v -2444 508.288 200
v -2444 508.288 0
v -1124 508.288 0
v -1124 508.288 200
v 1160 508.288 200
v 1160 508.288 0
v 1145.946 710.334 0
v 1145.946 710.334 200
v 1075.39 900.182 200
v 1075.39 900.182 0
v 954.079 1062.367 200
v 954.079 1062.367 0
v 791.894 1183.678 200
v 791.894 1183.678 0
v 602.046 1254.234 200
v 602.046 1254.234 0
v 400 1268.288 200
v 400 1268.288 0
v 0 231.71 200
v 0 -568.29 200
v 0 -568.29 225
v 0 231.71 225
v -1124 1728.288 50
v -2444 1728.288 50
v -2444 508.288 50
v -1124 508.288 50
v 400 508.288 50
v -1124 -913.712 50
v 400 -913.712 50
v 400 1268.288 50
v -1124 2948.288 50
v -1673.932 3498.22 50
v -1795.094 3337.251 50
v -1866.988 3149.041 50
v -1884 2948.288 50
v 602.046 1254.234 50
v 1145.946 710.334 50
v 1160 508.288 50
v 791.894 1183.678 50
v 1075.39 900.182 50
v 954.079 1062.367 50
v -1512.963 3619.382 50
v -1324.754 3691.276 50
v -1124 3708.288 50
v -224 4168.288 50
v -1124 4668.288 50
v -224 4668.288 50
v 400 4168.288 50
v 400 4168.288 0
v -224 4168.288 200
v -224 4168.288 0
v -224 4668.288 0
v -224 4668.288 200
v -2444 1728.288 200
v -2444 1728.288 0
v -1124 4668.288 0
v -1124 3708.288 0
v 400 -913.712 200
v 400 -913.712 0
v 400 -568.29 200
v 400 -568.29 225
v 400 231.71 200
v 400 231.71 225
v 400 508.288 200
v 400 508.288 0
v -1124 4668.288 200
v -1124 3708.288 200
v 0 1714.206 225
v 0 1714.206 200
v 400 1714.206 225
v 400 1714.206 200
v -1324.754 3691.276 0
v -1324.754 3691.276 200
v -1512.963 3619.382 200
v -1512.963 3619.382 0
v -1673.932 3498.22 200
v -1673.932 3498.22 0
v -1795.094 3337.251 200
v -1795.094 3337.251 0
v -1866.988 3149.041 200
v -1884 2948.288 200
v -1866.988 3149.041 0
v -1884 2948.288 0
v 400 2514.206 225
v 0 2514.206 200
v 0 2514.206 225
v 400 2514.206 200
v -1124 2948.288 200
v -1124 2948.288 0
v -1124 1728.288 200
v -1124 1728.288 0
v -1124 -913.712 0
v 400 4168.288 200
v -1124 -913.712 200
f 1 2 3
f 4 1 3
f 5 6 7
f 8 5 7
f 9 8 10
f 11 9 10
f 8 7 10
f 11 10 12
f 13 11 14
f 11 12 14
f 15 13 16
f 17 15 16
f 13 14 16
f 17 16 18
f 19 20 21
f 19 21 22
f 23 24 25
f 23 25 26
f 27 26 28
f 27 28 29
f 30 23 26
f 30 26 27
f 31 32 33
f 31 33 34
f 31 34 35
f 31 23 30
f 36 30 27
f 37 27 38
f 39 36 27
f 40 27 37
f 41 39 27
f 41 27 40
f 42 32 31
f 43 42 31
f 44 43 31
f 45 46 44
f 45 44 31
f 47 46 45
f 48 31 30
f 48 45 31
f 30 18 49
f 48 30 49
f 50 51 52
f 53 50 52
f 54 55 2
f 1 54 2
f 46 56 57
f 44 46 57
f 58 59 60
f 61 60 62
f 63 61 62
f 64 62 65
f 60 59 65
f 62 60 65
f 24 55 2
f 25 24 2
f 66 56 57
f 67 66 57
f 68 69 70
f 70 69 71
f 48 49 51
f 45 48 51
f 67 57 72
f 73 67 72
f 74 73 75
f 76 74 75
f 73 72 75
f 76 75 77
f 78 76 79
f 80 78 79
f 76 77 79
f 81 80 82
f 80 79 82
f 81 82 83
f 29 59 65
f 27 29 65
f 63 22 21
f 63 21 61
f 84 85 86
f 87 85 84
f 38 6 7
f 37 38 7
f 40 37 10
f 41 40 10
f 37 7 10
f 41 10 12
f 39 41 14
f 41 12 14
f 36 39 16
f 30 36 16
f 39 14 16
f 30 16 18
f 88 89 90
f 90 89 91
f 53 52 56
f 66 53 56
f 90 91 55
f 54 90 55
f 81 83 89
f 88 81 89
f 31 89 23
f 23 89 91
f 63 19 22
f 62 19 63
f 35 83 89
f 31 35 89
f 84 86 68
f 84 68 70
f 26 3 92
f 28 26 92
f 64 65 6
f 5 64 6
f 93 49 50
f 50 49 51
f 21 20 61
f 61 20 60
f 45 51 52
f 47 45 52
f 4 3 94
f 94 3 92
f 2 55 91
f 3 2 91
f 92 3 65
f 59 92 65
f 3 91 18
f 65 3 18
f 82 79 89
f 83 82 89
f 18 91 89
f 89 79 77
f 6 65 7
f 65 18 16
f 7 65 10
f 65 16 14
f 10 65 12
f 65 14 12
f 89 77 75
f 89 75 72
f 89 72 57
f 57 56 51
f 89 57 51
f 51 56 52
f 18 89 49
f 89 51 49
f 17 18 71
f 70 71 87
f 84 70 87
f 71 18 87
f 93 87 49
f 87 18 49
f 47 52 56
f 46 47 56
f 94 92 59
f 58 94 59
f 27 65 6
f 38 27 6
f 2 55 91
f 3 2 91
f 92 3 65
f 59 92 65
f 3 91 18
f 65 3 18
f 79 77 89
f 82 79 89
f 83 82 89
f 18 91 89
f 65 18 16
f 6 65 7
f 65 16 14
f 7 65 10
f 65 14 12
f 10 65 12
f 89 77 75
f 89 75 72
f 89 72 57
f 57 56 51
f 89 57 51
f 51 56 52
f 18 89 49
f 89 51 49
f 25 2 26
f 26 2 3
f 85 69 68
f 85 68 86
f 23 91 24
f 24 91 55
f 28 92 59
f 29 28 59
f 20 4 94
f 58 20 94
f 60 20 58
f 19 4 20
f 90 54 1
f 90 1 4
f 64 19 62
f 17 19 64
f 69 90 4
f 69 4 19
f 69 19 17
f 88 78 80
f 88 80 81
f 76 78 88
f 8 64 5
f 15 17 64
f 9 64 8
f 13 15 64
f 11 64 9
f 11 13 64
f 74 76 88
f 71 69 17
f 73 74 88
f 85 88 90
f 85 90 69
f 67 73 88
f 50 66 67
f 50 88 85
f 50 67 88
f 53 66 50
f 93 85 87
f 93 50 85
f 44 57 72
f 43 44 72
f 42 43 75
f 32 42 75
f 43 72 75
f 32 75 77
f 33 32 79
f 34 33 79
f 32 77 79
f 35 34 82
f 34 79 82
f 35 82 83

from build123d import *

# Parameters (mm, degrees)
F1_DEPTH = 200
F2_DEPTH = 50
F3_W     = 400
F3_H     = 800
F4_DEPTH = 25


# Not quite as in the source:
# - a feature names something its author has since deleted; it is built from what else it names


with BuildPart() as f1:
    # F0 (on Top) → F1 (new body)
    with BuildSketch(Plane.XY):
        with BuildLine():
            Line((-1884, 2948.2879470328), (-1124, 2948.2879470328))
            Line((-1124, 2948.2879470328), (-1124, 3708.2879470328))
            ThreePointArc((-1124, 3708.2879470328), (-1673.932332285, 3498.2202793178), (-1884, 2948.2879470328))
        make_face()
        Polygon((-1124, 508.2879470328), (-1124, -913.7120529672), (400, -913.7120529672), (400, -477.0959615707), (400, 330.1213979721), (400, 508.2879470328), (400, 1268.2879470328), (400, 1627.2879470328), (400, 2427.2879470328), (400, 4168.2879470328), (-224, 4168.2879470328), (-224, 4668.2879470328), (-1124, 4668.2879470328), (-1124, 4168.2879470328), (-1124, 3708.2879470328), (-1124, 2948.2879470328), (-1124, 1728.2879470328), (-2444, 1728.2879470328), (-2444, 508.2879470328), align=None)
        with BuildLine():
            Line((400, 1268.2879470328), (400, 508.2879470328))
            Line((400, 508.2879470328), (1160, 508.2879470328))
            ThreePointArc((1160, 508.2879470328), (954.0786279741, 1062.366575007), (400, 1268.2879470328))
        make_face()
    extrude(amount=F1_DEPTH)

    # F3 (on face) → F4 (join)
    with BuildSketch(Plane.XY.offset(200)):
        with Locations((200, 2114.2057418823)):
            Rectangle(F3_W, F3_H)
        with Locations((200, -168.2896107435)):
            Rectangle(F3_W, F3_H)
    extrude(amount=F4_DEPTH)


with BuildPart() as f2:
    # F0 (on Top) → F2 (new body)
    with BuildSketch(Plane.XY):
        Polygon((-1124, 508.2879470328), (-1124, -913.7120529672), (400, -913.7120529672), (400, -477.0959615707), (400, 330.1213979721), (400, 508.2879470328), (400, 1268.2879470328), (400, 1627.2879470328), (400, 2427.2879470328), (400, 4168.2879470328), (-224, 4168.2879470328), (-224, 4668.2879470328), (-1124, 4668.2879470328), (-1124, 4168.2879470328), (-1124, 3708.2879470328), (-1124, 2948.2879470328), (-1124, 1728.2879470328), (-2444, 1728.2879470328), (-2444, 508.2879470328), align=None)
        with BuildLine():
            Line((400, 1268.2879470328), (400, 508.2879470328))
            Line((400, 508.2879470328), (1160, 508.2879470328))
            ThreePointArc((1160, 508.2879470328), (954.0786279741, 1062.366575007), (400, 1268.2879470328))
        make_face()
        with BuildLine():
            Line((-1884, 2948.2879470328), (-1124, 2948.2879470328))
            Line((-1124, 2948.2879470328), (-1124, 3708.2879470328))
            ThreePointArc((-1124, 3708.2879470328), (-1673.932332285, 3498.2202793178), (-1884, 2948.2879470328))
        make_face()
    extrude(amount=F2_DEPTH)


solid = Compound([f1.part, f2.part])
